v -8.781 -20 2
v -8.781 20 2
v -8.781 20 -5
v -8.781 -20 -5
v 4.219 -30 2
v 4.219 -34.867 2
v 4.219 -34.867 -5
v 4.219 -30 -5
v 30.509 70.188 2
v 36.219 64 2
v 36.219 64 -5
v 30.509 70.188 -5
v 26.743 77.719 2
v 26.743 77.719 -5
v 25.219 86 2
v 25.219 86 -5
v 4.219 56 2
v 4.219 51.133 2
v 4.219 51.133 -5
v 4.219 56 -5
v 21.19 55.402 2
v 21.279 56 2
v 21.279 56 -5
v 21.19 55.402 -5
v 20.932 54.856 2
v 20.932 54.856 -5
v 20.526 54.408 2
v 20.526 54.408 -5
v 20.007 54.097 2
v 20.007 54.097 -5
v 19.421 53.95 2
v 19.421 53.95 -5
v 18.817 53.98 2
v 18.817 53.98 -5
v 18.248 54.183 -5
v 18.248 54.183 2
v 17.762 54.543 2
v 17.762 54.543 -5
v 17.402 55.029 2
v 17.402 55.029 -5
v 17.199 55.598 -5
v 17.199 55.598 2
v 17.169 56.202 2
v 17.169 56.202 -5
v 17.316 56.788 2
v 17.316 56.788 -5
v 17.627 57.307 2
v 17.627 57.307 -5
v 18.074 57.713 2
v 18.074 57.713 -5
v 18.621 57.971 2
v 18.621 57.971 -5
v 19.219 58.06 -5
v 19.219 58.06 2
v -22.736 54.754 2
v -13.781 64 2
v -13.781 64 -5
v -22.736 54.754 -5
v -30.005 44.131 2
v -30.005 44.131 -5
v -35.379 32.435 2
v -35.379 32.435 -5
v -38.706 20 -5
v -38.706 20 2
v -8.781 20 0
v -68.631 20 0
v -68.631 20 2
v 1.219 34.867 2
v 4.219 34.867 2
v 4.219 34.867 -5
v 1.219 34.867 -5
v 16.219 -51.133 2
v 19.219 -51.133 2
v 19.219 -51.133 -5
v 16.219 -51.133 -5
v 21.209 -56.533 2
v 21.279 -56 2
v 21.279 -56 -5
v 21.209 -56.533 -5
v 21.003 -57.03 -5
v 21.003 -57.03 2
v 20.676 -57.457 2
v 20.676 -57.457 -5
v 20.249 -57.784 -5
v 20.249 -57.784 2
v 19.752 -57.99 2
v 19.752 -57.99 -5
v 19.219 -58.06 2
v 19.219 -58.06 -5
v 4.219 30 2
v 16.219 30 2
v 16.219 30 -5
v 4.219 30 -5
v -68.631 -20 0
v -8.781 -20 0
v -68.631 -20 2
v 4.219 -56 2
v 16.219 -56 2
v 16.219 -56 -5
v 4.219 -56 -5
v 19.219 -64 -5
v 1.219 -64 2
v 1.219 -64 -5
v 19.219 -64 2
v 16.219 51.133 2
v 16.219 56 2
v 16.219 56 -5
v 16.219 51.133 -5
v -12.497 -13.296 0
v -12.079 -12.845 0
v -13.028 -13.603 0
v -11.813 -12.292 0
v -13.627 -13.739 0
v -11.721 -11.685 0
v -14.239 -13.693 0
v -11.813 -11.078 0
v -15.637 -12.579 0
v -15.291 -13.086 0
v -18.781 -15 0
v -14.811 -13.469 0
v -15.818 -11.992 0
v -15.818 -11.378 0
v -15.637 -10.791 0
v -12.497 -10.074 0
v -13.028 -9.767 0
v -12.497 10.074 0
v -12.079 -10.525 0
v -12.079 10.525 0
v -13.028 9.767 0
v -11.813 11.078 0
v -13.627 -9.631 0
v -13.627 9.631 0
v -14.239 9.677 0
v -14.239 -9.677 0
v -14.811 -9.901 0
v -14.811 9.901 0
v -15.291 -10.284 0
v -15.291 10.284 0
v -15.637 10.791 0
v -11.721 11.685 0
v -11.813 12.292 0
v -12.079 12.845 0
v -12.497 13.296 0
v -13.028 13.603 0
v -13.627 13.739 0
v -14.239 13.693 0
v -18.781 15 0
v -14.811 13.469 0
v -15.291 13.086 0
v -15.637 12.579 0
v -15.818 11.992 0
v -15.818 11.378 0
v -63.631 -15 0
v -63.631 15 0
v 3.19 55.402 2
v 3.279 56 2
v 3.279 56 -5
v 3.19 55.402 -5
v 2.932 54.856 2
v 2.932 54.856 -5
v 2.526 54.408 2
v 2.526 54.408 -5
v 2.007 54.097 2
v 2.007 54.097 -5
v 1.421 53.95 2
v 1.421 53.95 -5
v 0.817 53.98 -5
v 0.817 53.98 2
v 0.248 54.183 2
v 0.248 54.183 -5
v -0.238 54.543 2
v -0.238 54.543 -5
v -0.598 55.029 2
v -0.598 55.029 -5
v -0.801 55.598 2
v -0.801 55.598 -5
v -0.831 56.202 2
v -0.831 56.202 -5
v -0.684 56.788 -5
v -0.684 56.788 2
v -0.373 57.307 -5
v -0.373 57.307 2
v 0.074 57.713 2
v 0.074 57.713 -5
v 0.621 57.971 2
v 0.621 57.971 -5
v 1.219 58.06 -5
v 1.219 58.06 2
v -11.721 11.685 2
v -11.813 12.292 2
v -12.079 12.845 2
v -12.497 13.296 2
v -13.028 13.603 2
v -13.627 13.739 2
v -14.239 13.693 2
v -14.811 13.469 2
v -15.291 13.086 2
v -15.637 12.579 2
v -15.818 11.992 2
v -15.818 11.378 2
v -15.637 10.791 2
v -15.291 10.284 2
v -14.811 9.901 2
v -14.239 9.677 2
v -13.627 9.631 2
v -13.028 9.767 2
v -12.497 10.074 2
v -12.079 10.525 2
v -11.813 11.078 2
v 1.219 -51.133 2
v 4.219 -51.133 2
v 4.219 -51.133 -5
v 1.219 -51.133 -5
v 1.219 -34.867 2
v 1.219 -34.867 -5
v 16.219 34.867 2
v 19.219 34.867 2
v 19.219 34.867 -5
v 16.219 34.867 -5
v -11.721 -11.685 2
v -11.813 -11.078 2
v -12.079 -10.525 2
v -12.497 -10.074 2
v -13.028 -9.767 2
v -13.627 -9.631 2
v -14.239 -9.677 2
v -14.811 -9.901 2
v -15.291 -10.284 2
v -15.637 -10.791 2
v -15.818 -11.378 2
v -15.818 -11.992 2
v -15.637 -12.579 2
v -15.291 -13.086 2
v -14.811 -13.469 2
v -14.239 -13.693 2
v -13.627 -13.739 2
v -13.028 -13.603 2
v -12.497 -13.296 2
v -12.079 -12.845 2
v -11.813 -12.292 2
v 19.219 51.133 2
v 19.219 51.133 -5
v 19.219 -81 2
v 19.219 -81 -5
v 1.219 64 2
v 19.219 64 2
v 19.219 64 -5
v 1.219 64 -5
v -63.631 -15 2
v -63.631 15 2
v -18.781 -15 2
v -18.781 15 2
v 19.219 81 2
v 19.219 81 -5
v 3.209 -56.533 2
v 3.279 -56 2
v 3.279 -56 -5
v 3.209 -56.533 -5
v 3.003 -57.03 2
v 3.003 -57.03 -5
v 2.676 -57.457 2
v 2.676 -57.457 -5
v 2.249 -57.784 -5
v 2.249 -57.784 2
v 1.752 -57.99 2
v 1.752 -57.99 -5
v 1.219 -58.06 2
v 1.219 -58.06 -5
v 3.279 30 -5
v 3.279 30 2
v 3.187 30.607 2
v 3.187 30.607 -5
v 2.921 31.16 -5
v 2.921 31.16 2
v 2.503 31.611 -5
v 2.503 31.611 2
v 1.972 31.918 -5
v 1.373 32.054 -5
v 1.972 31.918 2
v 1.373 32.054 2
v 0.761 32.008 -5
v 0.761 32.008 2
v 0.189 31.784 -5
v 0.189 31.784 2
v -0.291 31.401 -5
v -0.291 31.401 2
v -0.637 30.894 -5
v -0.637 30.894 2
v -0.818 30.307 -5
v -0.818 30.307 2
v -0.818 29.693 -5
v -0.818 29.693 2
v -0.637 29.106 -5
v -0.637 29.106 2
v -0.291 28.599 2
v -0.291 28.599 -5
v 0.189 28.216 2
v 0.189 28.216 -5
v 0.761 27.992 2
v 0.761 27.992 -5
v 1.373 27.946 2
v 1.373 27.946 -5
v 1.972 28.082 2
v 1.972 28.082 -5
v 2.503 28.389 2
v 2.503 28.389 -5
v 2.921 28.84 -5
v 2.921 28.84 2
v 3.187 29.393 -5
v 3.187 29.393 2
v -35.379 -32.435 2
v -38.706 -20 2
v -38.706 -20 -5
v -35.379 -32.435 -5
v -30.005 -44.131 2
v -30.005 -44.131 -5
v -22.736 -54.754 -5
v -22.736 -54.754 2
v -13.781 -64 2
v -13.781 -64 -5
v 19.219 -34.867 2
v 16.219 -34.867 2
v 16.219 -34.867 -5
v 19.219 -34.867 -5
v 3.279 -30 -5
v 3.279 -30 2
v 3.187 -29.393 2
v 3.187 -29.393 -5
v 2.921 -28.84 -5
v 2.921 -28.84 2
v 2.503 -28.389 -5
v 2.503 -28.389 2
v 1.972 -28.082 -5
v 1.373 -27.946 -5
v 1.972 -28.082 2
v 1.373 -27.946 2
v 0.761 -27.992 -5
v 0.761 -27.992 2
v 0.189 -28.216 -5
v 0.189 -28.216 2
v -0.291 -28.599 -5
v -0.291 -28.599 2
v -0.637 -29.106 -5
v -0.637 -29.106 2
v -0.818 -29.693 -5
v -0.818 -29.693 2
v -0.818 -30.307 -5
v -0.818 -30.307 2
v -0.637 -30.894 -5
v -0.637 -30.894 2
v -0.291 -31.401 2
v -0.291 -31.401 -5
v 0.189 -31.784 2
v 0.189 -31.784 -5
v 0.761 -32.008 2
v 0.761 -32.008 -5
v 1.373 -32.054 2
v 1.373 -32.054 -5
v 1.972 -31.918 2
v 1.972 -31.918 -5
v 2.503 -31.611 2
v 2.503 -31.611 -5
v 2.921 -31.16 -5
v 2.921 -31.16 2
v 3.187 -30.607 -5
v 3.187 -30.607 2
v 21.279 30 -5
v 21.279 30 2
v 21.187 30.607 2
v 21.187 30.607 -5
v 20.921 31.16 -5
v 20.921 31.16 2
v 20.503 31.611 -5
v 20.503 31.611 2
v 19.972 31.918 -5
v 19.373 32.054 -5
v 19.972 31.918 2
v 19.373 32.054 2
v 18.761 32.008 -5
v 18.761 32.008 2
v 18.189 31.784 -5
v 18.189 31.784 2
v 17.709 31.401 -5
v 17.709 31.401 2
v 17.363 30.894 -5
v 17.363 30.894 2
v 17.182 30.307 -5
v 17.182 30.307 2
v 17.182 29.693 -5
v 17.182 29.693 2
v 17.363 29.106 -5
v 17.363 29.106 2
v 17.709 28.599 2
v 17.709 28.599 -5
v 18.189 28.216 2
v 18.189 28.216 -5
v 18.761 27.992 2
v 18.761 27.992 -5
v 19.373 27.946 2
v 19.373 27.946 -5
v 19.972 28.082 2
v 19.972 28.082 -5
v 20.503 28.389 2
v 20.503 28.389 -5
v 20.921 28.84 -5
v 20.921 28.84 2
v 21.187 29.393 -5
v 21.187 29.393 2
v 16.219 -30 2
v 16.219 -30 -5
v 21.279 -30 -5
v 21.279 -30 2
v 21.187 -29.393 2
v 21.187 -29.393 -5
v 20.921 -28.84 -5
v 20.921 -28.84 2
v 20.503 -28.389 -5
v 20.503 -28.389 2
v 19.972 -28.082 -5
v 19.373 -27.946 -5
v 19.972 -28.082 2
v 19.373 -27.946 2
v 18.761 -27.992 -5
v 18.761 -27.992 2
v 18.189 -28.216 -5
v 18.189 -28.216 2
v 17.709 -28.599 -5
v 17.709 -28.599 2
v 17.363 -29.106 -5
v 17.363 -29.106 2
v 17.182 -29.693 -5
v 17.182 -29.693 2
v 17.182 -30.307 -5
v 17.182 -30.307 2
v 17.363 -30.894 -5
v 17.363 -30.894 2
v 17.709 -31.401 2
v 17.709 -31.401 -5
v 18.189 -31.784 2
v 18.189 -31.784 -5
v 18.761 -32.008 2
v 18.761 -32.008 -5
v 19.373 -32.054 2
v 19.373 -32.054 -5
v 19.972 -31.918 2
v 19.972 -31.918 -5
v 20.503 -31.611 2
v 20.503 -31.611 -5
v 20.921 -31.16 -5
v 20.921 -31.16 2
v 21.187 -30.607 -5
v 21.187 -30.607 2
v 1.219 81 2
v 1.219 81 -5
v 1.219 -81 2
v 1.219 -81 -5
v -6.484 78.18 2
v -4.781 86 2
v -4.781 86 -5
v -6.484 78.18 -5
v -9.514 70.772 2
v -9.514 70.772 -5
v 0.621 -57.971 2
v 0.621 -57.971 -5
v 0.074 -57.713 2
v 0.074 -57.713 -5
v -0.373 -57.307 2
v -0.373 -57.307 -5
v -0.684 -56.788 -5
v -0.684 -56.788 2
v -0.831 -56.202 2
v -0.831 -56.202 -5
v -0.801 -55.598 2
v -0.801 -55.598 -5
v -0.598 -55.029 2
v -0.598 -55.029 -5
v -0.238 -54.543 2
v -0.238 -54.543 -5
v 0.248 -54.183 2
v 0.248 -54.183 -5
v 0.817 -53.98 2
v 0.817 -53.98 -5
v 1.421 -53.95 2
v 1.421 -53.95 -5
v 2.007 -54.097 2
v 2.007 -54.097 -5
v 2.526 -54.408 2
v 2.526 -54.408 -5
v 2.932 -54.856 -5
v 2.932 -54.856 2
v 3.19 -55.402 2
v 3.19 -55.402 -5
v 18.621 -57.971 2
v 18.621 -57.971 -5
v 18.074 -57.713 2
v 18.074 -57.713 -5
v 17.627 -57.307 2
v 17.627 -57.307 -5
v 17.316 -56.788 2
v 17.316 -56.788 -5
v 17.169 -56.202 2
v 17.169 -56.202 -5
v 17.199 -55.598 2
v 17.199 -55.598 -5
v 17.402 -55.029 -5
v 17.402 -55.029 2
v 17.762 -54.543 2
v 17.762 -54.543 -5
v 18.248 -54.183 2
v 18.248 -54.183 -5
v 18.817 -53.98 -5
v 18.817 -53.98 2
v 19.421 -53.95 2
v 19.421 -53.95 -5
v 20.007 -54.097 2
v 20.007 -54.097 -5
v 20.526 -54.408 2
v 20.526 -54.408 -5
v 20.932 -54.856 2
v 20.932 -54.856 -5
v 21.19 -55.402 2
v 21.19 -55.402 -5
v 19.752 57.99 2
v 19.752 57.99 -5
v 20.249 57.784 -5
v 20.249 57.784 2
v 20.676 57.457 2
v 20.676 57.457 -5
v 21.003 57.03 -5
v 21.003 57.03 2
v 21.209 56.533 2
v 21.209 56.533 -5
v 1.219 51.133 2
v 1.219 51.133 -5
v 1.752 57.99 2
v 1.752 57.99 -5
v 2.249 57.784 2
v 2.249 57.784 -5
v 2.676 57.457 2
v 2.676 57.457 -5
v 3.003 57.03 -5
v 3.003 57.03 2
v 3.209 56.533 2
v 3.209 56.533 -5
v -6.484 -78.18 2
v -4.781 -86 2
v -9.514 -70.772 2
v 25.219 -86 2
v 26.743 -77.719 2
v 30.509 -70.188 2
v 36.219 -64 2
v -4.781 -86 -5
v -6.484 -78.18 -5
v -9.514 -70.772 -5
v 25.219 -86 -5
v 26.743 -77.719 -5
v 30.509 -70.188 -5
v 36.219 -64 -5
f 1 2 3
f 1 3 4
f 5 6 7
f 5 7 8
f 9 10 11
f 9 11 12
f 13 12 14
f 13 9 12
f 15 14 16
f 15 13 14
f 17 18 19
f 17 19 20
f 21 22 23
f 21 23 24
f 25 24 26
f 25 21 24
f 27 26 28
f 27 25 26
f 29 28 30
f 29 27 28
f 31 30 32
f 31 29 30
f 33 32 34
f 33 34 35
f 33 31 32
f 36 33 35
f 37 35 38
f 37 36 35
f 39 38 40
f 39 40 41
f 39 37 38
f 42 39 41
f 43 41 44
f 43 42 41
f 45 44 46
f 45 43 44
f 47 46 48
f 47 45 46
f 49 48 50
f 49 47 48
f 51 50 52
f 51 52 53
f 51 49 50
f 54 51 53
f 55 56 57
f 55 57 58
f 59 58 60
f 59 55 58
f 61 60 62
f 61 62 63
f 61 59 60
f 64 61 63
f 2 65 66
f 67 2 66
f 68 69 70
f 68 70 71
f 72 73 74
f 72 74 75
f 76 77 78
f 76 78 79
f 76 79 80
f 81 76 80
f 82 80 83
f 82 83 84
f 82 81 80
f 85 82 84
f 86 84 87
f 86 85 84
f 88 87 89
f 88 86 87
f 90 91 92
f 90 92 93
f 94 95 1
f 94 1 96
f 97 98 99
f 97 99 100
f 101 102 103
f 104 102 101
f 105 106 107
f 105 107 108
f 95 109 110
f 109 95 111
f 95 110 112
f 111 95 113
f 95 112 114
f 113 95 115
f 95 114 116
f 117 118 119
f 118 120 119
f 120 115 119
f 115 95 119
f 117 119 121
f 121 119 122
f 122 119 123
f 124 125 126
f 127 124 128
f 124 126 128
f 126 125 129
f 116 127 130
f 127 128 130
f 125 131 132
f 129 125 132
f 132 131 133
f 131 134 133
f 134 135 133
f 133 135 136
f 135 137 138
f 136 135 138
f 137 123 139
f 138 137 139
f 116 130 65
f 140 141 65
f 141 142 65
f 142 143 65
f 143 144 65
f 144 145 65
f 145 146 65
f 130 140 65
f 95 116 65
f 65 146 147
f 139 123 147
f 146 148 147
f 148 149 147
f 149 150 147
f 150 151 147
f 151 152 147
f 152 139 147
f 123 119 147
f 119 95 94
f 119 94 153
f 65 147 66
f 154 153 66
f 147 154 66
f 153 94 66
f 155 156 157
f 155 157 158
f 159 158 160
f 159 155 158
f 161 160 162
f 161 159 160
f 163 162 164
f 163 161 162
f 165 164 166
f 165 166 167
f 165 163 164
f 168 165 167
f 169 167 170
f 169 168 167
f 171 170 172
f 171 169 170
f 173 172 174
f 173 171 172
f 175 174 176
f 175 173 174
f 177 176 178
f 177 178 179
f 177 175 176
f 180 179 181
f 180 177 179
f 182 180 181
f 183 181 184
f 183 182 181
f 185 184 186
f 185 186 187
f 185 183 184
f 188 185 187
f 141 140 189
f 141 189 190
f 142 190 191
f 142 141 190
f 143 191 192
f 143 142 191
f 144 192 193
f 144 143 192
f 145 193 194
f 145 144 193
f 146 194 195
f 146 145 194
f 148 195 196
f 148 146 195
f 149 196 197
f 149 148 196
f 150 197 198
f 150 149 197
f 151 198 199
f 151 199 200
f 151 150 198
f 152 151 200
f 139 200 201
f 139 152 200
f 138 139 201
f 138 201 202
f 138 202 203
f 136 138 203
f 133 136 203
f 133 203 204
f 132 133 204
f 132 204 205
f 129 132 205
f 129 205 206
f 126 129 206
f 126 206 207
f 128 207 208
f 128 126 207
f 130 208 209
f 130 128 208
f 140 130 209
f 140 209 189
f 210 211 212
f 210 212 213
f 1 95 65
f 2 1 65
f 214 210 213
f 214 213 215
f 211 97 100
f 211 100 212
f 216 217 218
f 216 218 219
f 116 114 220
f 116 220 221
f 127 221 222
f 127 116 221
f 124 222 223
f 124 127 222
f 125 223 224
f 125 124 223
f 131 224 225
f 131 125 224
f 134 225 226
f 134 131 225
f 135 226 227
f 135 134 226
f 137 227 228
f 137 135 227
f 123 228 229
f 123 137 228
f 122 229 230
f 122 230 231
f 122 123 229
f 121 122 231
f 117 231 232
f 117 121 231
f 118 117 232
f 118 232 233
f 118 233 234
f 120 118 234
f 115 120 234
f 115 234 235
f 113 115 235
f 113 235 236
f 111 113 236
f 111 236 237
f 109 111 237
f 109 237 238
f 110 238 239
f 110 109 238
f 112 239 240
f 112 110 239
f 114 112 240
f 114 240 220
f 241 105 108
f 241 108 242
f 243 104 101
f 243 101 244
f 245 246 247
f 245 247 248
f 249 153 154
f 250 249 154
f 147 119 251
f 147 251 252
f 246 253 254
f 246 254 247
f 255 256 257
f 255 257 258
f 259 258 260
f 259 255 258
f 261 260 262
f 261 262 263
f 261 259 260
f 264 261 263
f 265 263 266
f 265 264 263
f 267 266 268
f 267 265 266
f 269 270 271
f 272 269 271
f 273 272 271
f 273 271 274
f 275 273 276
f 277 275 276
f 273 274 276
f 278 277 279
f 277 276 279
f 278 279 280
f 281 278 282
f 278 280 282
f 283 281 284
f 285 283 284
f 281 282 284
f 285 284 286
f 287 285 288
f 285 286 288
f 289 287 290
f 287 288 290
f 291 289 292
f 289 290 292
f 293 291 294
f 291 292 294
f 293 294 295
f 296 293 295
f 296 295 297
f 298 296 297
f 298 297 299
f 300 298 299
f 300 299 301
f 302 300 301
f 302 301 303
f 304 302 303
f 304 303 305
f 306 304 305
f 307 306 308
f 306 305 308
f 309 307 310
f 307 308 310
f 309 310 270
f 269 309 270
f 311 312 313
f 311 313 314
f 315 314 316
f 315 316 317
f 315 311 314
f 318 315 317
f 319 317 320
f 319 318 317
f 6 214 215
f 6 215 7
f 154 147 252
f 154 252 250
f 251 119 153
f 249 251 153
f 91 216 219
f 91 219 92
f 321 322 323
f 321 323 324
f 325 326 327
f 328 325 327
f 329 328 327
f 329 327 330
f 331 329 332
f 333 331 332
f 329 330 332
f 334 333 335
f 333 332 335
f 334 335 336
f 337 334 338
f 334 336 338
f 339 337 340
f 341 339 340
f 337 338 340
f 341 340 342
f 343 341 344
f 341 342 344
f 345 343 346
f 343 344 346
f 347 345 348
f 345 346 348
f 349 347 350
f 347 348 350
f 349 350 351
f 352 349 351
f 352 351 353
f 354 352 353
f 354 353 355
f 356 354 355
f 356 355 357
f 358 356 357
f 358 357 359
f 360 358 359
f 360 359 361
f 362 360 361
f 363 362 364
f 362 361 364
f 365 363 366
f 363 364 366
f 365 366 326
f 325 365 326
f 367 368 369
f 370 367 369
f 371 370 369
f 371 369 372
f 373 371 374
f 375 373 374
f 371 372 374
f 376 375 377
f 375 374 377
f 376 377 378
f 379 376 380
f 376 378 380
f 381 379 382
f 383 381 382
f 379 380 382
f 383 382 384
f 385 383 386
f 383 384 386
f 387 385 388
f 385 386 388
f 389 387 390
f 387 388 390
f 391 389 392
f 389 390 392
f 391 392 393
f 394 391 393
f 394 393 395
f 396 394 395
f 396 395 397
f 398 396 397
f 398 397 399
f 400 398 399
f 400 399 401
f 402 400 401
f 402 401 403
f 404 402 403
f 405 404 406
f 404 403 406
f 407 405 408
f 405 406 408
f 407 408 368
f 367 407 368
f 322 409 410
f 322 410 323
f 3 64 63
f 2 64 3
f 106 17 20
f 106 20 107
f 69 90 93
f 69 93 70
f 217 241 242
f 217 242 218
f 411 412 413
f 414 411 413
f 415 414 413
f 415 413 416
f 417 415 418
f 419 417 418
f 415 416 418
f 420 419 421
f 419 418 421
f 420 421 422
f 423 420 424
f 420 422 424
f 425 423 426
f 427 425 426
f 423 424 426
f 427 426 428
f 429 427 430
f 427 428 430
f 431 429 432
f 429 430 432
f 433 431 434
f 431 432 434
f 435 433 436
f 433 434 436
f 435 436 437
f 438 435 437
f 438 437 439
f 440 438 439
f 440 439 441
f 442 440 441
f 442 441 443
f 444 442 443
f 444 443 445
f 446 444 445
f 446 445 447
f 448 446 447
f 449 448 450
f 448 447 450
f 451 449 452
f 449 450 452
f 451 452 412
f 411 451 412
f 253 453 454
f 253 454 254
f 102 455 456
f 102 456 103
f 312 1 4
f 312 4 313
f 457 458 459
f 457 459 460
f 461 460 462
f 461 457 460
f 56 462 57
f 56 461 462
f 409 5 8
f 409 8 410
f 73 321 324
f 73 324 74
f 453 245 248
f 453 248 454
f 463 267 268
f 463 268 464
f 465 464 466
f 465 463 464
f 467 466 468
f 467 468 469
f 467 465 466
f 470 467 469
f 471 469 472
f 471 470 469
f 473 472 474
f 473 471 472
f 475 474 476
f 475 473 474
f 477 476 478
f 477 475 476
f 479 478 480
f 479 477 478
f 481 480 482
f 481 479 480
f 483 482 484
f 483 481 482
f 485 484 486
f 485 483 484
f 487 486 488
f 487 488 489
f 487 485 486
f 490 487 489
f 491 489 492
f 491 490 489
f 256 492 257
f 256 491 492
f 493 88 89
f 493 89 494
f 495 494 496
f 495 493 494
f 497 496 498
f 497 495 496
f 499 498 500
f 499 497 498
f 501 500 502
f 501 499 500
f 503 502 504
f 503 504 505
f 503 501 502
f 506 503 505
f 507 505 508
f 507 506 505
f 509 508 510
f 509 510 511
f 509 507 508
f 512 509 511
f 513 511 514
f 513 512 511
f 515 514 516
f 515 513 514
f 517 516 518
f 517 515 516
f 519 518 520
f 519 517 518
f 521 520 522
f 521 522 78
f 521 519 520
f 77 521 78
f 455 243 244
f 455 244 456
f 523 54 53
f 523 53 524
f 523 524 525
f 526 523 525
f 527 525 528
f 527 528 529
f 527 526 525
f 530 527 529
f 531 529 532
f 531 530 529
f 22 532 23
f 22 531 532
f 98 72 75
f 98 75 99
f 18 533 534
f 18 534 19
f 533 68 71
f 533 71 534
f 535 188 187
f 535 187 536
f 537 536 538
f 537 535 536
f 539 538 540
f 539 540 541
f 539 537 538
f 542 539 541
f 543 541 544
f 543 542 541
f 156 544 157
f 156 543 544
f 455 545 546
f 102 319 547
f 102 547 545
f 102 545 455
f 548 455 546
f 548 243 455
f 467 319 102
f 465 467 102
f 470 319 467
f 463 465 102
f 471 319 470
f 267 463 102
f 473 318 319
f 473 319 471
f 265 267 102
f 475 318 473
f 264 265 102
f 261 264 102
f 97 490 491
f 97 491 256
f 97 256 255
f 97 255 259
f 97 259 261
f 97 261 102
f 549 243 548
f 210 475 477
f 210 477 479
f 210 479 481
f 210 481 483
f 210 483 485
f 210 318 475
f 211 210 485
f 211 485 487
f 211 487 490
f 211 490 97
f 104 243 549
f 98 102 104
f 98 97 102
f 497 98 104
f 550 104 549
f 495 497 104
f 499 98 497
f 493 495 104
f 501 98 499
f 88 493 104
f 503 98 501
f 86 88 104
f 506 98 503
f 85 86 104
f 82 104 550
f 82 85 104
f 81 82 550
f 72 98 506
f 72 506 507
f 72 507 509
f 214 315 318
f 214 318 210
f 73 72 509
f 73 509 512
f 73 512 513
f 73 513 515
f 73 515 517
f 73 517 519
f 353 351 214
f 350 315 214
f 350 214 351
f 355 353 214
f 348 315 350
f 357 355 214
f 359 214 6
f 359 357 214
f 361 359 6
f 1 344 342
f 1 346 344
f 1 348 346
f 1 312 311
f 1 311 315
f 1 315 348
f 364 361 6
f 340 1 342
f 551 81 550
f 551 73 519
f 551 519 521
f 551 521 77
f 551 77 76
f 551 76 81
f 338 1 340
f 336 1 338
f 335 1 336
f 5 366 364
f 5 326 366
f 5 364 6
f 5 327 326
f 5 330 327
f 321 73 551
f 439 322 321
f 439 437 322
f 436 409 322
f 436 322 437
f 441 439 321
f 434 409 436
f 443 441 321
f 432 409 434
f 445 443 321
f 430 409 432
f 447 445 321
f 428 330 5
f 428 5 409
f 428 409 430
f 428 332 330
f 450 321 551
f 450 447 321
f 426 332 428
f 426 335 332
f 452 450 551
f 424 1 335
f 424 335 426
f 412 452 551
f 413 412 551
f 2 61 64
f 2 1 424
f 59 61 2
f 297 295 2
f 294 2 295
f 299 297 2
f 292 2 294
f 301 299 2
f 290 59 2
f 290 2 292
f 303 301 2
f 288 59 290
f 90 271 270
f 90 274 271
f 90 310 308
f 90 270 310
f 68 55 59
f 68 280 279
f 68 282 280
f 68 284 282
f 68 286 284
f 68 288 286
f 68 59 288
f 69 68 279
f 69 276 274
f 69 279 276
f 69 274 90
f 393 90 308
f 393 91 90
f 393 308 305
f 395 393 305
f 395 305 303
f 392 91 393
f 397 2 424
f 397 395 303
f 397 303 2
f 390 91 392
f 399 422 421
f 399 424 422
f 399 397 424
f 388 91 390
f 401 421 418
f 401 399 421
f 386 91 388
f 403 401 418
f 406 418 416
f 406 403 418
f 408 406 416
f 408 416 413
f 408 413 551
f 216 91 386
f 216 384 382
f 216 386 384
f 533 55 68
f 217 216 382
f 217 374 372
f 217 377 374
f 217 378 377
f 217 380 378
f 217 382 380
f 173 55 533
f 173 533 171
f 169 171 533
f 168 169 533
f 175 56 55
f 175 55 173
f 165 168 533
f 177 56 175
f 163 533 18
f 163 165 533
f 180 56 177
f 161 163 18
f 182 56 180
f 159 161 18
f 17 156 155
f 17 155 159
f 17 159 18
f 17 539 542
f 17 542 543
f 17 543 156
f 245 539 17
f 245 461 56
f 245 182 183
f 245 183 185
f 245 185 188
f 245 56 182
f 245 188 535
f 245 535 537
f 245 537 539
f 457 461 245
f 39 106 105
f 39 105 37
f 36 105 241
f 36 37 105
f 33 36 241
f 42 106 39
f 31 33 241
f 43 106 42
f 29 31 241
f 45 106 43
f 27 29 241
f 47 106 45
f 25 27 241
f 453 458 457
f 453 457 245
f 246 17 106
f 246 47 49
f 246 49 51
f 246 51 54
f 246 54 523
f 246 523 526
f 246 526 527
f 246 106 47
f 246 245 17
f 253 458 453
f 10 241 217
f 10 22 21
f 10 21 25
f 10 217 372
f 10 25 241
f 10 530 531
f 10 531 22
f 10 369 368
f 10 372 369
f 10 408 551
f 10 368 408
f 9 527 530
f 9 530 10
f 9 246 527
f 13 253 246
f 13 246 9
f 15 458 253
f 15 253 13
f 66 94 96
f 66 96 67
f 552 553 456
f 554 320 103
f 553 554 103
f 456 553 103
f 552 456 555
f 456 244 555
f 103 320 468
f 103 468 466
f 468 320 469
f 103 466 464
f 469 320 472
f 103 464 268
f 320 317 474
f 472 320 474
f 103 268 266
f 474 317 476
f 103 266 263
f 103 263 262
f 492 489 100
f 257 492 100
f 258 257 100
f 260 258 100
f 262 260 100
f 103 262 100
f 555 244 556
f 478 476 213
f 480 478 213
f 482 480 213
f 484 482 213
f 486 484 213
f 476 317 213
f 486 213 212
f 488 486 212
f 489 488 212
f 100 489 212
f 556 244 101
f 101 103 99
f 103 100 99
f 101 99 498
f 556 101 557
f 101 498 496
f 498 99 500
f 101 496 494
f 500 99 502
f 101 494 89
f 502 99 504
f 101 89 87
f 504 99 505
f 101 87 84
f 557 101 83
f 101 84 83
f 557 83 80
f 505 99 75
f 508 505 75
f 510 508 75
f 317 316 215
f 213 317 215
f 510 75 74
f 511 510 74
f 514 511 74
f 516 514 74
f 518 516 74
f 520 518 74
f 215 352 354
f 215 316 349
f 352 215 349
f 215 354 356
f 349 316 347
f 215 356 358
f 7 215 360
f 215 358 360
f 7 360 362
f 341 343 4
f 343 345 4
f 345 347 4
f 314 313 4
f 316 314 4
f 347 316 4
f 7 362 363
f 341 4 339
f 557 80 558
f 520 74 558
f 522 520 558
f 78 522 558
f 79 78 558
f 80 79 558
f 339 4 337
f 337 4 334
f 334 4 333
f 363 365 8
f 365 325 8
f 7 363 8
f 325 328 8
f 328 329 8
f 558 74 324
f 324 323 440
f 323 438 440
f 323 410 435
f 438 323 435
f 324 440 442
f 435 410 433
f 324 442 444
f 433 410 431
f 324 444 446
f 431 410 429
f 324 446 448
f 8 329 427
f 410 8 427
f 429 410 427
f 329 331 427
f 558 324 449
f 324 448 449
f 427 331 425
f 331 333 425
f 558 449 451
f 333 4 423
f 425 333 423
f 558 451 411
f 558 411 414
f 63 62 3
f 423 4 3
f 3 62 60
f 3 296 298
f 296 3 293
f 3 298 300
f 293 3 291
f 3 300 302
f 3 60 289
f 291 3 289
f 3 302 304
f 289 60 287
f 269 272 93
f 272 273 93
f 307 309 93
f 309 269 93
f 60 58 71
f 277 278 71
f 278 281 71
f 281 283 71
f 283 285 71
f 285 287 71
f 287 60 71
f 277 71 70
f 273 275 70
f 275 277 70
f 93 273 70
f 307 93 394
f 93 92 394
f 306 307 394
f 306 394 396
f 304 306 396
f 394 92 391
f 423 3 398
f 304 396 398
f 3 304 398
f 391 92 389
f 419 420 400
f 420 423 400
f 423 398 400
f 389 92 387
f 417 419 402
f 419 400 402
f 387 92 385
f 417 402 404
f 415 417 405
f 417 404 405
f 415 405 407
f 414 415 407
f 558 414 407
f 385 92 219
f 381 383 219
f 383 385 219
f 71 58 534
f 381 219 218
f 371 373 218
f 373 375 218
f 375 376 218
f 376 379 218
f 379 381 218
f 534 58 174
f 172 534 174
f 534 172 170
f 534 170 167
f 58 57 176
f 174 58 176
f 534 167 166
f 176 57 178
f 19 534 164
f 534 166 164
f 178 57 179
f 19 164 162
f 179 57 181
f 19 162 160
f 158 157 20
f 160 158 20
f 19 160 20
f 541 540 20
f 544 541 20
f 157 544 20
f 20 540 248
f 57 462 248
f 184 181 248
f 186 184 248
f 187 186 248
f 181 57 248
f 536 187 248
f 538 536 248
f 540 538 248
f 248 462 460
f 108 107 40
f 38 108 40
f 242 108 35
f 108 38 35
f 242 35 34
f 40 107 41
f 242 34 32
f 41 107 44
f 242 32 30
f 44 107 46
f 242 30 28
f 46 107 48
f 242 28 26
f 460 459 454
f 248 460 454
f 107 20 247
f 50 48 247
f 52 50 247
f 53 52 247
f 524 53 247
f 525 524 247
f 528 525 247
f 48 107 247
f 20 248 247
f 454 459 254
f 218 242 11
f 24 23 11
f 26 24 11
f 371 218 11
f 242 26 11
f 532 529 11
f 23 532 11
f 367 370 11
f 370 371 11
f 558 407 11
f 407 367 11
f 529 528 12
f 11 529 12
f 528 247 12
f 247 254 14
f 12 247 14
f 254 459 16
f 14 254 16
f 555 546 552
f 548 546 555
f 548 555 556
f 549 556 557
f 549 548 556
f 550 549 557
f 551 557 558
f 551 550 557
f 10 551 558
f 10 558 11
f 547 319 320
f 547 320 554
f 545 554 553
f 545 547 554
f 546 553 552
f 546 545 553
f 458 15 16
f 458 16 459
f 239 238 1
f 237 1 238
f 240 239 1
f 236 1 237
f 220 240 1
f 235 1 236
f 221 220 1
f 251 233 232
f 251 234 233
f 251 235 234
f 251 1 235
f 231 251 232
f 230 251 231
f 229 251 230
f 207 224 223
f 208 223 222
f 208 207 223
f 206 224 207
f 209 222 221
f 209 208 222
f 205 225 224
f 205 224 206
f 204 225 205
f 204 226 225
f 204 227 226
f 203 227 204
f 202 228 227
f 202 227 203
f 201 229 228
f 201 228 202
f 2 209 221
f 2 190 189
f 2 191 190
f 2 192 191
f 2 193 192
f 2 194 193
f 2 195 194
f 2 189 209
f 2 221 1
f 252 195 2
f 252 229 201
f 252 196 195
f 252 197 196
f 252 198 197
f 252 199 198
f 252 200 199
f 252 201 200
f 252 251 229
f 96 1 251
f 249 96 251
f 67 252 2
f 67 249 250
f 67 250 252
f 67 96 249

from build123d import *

# Parameters (mm, degrees)
SKETCH1_W           = 40
SKETCH1_H           = 59.85
SKETCH1_R           = 2.06
SKETCH1_W_2         = 30
SKETCH1_H_2         = 44.85
BOSS_EXTRUDE2_DEPTH = 2
SKETCH2_R           = 2.06
BOSS_EXTRUDE3_DEPTH = 7


with BuildPart() as part:
    # Sketch1 → Boss-Extrude2 (new body)
    with BuildSketch(Plane(origin=(0, 0, 0), x_dir=(0, 1, 0), z_dir=(0, 0, 1))):
        with Locations((0, 38.706068974)):
            Rectangle(SKETCH1_W, SKETCH1_H)
        with Locations(Location((-11.685, 13.781068974, 0), (0, 0, 270))):
            Circle(SKETCH1_R, mode=Mode.SUBTRACT)
        with Locations(Location((11.685, 13.781068974, 0), (0, 0, 270))):
            Circle(SKETCH1_R, mode=Mode.SUBTRACT)
        with Locations((0, 41.206068974)):
            Rectangle(SKETCH1_W_2, SKETCH1_H_2, mode=Mode.SUBTRACT)
    extrude(amount=BOSS_EXTRUDE2_DEPTH)


with BuildPart() as body_2:
    # Sketch2 → Boss-Extrude3 (new body)
    # profile 1 of 6: a face of its own
    with BuildSketch(Plane.XY.offset(2)):
        with BuildLine():
            Line((-13.781068974, -64), (-13.781068974, -20))
            Line((-13.781068974, -20), (-38.706068974, -20))
            ThreePointArc((-38.706068974, -20), (-30.004659229, -44.13057215), (-13.781068974, -64))
        make_face()
    # profile 2 of 6: a face of its own
    with BuildSketch(Plane.XY.offset(2)):
        with BuildLine():
            Line((-38.706068974, 20), (-13.781068974, 20))
            Line((-13.781068974, 20), (-13.781068974, 64))
            ThreePointArc((-13.781068974, 64), (-30.004659229, 44.13057215), (-38.706068974, 20))
        make_face()
    # profile 3 of 6: a face of its own
    with BuildSketch(Plane.XY.offset(2)):
        Polygon((36.218931026, 0), (-8.781068974, 0), (-8.781068974, -20), (-13.781068974, -20), (-13.781068974, -64), (1.218931026, -64), (19.218931026, -64), (36.218931026, -64), align=None)
        with BuildLine():
            ThreePointArc((3.278931026, -56), (2.675570995, -57.456639969), (1.218931026, -58.06))
            ThreePointArc((1.218931026, -58.06), (-0.237708943, -54.543360031), (3.278931026, -56))
        make_face(mode=Mode.SUBTRACT)
        with BuildLine():
            ThreePointArc((21.278931026, -56), (20.675570995, -57.456639969), (19.218931026, -58.06))
            ThreePointArc((19.218931026, -58.06), (17.762291057, -54.543360031), (21.278931026, -56))
        make_face(mode=Mode.SUBTRACT)
        Polygon((1.218931026, -34.867465412), (4.218931026, -34.867465412), (4.218931026, -30), (16.218931026, -30), (16.218931026, -34.867465412), (19.218931026, -34.867465412), (19.218931026, -51.132534588), (16.218931026, -51.132534588), (16.218931026, -56), (4.218931026, -56), (4.218931026, -51.132534588), (1.218931026, -51.132534588), align=None, mode=Mode.SUBTRACT)
        with Locations((1.218931026, -30)):
            Circle(SKETCH2_R, mode=Mode.SUBTRACT)
        with Locations((19.218931026, -30)):
            Circle(SKETCH2_R, mode=Mode.SUBTRACT)
    # profile 4 of 6: a face of its own
    with BuildSketch(Plane.XY.offset(2)):
        with BuildLine():
            ThreePointArc((25.218931026, -86), (28.360591797, -73.820830386), (36.218931026, -64))
            Line((36.218931026, -64), (19.218931026, -64))
            Line((19.218931026, -64), (19.218931026, -81))
            Line((19.218931026, -81), (1.218931026, -81))
            Line((1.218931026, -81), (1.218931026, -64))
            Line((1.218931026, -64), (-13.781068974, -64))
            ThreePointArc((-13.781068974, -64), (-7.838079551, -74.409686145), (-4.781068974, -86))
            Line((-4.781068974, -86), (25.218931026, -86))
        make_face()
    # profile 5 of 6: a face of its own
    with BuildSketch(Plane.XY.offset(2)):
        Polygon((-8.781068974, 20), (-8.781068974, 0), (36.218931026, 0), (36.218931026, 64), (19.218931026, 64), (1.218931026, 64), (-13.781068974, 64), (-13.781068974, 20), align=None)
        with Locations((1.218931026, 30)):
            Circle(SKETCH2_R, mode=Mode.SUBTRACT)
        with Locations((19.218931026, 30)):
            Circle(SKETCH2_R, mode=Mode.SUBTRACT)
        with BuildLine():
            ThreePointArc((3.278931026, 56), (-0.237708943, 54.543360031), (1.218931026, 58.06))
            ThreePointArc((1.218931026, 58.06), (2.675570995, 57.456639969), (3.278931026, 56))
        make_face(mode=Mode.SUBTRACT)
        Polygon((1.218931026, 34.867465412), (1.218931026, 51.132534588), (4.218931026, 51.132534588), (4.218931026, 56), (16.218931026, 56), (16.218931026, 51.132534588), (19.218931026, 51.132534588), (19.218931026, 34.867465412), (16.218931026, 34.867465412), (16.218931026, 30), (4.218931026, 30), (4.218931026, 34.867465412), align=None, mode=Mode.SUBTRACT)
        with BuildLine():
            ThreePointArc((21.278931026, 56), (17.762291057, 54.543360031), (19.218931026, 58.06))
            ThreePointArc((19.218931026, 58.06), (20.675570995, 57.456639969), (21.278931026, 56))
        make_face(mode=Mode.SUBTRACT)
    # profile 6 of 6: a face of its own
    with BuildSketch(Plane.XY.offset(2)):
        with BuildLine():
            Line((19.218931026, 64), (36.218931026, 64))
            ThreePointArc((36.218931026, 64), (28.360591797, 73.820830386), (25.218931026, 86))
            Line((25.218931026, 86), (-4.781068974, 86))
            ThreePointArc((-4.781068974, 86), (-7.838079551, 74.409686145), (-13.781068974, 64))
            Line((-13.781068974, 64), (1.218931026, 64))
            Line((1.218931026, 64), (1.218931026, 81))
            Line((1.218931026, 81), (19.218931026, 81))
            Line((19.218931026, 81), (19.218931026, 64))
        make_face()
    extrude(amount=-BOSS_EXTRUDE3_DEPTH)


solid = Compound([part.part, body_2.part])
